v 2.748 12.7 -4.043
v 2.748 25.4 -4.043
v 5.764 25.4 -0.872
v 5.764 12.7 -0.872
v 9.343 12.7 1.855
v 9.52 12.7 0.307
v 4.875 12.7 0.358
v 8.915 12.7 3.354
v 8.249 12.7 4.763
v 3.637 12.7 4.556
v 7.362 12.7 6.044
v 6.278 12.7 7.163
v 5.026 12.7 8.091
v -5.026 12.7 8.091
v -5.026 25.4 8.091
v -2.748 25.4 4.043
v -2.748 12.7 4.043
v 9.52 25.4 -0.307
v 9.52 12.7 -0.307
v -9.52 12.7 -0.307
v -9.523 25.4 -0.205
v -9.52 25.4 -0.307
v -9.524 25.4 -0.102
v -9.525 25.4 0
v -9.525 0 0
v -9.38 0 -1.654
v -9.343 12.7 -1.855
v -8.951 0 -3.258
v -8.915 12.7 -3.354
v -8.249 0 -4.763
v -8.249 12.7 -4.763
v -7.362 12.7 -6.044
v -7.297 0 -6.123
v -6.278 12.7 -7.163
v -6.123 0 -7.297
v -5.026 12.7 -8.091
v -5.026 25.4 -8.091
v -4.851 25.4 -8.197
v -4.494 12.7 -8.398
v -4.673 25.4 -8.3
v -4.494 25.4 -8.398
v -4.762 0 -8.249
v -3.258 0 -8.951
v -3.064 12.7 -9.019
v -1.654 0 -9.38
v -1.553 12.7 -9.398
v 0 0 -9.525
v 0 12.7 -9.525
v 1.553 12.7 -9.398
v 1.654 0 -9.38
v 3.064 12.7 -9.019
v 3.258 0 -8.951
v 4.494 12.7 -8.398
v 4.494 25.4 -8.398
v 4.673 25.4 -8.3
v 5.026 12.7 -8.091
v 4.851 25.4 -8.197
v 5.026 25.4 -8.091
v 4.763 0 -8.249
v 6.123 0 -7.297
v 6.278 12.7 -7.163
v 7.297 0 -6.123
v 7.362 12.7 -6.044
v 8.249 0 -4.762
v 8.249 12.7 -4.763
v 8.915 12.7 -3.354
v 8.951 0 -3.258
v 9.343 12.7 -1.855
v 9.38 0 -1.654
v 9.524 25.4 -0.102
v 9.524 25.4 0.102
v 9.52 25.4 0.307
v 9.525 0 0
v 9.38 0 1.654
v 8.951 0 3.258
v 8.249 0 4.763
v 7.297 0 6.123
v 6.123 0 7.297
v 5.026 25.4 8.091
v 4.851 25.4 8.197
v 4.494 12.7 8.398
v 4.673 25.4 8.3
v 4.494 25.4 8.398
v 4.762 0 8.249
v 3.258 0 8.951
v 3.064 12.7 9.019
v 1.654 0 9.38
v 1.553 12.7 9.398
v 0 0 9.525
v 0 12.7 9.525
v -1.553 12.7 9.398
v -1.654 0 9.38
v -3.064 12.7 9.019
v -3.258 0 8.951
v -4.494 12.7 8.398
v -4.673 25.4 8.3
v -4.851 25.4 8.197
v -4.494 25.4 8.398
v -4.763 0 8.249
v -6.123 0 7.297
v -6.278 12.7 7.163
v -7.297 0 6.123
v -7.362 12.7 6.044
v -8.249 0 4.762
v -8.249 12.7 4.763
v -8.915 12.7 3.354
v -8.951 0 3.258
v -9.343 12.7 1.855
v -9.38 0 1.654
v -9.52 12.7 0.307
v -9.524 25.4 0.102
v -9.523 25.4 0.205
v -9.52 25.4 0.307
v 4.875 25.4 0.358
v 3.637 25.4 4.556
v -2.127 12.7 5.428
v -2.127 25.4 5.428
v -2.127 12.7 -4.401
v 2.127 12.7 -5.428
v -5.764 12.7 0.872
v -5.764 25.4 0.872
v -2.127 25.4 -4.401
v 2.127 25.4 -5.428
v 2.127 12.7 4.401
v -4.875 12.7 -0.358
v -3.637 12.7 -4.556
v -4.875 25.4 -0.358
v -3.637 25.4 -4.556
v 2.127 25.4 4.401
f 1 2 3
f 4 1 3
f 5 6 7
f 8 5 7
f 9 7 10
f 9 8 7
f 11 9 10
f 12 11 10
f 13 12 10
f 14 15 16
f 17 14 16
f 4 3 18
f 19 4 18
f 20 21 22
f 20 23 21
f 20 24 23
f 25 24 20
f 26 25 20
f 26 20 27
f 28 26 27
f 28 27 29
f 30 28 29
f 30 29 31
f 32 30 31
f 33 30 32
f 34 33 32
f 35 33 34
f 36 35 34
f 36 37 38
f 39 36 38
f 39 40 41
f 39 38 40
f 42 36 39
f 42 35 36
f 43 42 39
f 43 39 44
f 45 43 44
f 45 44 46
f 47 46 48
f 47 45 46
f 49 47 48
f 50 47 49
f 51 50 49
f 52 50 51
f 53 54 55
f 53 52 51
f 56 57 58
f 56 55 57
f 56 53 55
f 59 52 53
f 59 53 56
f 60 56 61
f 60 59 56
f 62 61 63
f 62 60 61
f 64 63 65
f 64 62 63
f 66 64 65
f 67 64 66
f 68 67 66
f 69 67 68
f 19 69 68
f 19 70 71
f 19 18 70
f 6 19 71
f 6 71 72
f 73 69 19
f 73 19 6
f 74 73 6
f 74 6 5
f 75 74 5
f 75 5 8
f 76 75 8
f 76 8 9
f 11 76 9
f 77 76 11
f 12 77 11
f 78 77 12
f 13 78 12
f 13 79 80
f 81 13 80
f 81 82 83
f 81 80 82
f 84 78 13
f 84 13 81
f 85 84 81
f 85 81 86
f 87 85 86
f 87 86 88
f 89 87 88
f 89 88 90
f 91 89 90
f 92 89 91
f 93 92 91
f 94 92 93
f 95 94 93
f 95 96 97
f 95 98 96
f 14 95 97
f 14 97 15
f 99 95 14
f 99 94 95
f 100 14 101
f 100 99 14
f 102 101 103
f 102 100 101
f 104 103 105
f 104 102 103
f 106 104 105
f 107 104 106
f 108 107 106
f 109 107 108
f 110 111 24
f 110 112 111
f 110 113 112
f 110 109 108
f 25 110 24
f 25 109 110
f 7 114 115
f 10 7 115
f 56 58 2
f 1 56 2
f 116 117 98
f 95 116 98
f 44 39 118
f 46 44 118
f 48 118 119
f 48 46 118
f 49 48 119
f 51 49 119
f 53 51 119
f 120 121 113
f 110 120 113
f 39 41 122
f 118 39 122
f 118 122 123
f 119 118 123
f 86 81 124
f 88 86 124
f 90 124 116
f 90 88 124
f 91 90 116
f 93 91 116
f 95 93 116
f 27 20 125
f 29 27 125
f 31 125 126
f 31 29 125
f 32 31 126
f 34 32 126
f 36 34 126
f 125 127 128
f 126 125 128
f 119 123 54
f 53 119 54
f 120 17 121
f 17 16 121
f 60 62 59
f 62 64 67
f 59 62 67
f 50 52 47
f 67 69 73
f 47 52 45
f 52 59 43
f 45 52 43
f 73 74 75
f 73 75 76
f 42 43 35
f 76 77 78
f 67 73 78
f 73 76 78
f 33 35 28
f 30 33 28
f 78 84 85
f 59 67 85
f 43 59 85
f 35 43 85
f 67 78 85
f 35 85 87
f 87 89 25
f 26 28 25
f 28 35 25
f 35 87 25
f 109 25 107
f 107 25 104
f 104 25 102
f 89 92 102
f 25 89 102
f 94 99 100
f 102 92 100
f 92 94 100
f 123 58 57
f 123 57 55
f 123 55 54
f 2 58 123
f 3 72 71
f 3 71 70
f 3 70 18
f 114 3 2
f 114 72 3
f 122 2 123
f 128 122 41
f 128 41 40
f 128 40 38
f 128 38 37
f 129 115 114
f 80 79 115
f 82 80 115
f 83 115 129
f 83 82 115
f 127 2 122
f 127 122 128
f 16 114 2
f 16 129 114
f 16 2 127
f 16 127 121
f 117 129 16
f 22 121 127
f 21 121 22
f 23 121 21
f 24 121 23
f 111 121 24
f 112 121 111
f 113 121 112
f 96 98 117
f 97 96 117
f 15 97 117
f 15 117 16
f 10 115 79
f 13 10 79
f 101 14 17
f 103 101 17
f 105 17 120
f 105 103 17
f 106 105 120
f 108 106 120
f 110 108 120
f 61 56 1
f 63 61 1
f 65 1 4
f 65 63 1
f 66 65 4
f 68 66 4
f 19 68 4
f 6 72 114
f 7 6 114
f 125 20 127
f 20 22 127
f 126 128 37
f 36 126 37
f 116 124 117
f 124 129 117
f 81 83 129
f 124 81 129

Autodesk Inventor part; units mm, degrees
ref_plane "YZ Plane" through (0, 0, 0) normal (1, 0, 0) x (0, 1, 0)
ref_plane "XZ Plane" through (0, 0, 0) normal (0, 1, 0) x (-1, 0, 0)
ref_plane "XY Plane" through (0, 0, 0) normal (0, 0, 1) x (1, 0, 0)
sketch "Sketch1" plane through (0, 0, 0) normal (0, 1, 0) x (-1, 0, 0)
  circle A0 centre (0, 0) radius 9.525
  dimension "d0" = 19.05
extrude "Extrusion1" add sketch "Sketch1" along normal blind 25.4
sketch "Sketch2" plane through (0, 25.4, 0) normal (0, 1, 0) x (1, 0, 0)
  arc A0 (4.4938, 8.3983) -> (-4.4938, 8.3983) centre (0, 0) ccw
  line L0 (-4.4938, 8.3983) -> (-2.1272, 4.4011)
  line L1 (-2.1272, 4.4011) -> (2.1272, 5.428)
  line L2 (2.1272, 5.428) -> (4.4938, 8.3983)
extrude "Extrusion2" cut sketch "Sketch2" against normal blind 12.7
pattern_circular "Circular Pattern1" count 6 over 360 about axis through (0, -10, 0) along (0, 1, 0) of "Extrusion2"
properties part number "test"
